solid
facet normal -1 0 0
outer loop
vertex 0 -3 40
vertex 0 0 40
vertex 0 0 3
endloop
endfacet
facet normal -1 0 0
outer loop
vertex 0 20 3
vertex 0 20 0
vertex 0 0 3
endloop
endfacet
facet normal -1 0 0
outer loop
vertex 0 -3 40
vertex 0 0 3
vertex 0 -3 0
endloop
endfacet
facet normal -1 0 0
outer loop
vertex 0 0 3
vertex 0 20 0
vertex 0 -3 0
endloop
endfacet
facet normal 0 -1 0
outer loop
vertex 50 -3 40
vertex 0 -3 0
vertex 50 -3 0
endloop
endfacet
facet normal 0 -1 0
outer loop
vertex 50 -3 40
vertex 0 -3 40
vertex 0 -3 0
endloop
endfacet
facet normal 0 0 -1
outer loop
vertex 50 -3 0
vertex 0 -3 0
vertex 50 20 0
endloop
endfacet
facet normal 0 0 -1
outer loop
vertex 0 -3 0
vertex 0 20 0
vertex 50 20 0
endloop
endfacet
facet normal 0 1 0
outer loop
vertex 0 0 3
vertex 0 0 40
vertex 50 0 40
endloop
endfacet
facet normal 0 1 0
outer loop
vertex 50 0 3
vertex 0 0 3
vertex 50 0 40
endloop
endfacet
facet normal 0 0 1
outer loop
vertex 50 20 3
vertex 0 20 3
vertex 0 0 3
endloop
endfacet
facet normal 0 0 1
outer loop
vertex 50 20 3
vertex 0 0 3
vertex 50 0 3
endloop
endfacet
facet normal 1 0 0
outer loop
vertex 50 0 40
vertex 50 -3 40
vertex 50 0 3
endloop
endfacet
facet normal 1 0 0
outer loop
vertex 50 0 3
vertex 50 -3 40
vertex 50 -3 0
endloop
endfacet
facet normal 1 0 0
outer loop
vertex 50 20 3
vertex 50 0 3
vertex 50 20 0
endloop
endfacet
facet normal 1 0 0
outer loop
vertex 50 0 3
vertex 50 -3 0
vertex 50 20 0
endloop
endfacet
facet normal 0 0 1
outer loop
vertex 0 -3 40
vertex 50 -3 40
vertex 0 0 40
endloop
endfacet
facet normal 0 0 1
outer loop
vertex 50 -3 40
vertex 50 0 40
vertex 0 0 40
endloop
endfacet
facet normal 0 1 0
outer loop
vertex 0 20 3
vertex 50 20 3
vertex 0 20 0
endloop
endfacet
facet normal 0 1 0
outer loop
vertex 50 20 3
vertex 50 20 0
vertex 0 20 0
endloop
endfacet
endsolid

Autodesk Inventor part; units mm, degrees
ref_plane "YZ Plane" through (0, 0, 0) normal (1, 0, 0) x (0, 1, 0)
ref_plane "XZ Plane" through (0, 0, 0) normal (0, 1, 0) x (-1, 0, 0)
ref_plane "XY Plane" through (0, 0, 0) normal (0, 0, 1) x (1, 0, 0)
sketch "Sketch1" plane through (0, 0, 0) normal (0, 0, 1) x (1, 0, 0)
  line L0 (0, 0) -> (50, 0)
  line L1 (50, 0) -> (50, 20)
  line L2 (50, 20) -> (0, 20)
  line L3 (0, 20) -> (0, 0)
  dimension "d0" = 50
  dimension "d1" = 20
extrude "Extrusion1" add sketch "Sketch1" along normal blind 3
sketch "Sketch2" plane through (0, 0, 0) normal (0, -1, 0) x (1, 0, 0)
  line L0 (0, 0) -> (50, 0) projected
  line L1 (0, 0) -> (50, 0)
  line L2 (50, 0) -> (50, 40)
  line L3 (50, 40) -> (0, 40)
  line L4 (0, 40) -> (0, 0)
  line L5 (50, 0) -> (50, 3) projected
  dimension "d4" = 40
extrude "Extrusion2" add sketch "Sketch2" along normal blind 3
